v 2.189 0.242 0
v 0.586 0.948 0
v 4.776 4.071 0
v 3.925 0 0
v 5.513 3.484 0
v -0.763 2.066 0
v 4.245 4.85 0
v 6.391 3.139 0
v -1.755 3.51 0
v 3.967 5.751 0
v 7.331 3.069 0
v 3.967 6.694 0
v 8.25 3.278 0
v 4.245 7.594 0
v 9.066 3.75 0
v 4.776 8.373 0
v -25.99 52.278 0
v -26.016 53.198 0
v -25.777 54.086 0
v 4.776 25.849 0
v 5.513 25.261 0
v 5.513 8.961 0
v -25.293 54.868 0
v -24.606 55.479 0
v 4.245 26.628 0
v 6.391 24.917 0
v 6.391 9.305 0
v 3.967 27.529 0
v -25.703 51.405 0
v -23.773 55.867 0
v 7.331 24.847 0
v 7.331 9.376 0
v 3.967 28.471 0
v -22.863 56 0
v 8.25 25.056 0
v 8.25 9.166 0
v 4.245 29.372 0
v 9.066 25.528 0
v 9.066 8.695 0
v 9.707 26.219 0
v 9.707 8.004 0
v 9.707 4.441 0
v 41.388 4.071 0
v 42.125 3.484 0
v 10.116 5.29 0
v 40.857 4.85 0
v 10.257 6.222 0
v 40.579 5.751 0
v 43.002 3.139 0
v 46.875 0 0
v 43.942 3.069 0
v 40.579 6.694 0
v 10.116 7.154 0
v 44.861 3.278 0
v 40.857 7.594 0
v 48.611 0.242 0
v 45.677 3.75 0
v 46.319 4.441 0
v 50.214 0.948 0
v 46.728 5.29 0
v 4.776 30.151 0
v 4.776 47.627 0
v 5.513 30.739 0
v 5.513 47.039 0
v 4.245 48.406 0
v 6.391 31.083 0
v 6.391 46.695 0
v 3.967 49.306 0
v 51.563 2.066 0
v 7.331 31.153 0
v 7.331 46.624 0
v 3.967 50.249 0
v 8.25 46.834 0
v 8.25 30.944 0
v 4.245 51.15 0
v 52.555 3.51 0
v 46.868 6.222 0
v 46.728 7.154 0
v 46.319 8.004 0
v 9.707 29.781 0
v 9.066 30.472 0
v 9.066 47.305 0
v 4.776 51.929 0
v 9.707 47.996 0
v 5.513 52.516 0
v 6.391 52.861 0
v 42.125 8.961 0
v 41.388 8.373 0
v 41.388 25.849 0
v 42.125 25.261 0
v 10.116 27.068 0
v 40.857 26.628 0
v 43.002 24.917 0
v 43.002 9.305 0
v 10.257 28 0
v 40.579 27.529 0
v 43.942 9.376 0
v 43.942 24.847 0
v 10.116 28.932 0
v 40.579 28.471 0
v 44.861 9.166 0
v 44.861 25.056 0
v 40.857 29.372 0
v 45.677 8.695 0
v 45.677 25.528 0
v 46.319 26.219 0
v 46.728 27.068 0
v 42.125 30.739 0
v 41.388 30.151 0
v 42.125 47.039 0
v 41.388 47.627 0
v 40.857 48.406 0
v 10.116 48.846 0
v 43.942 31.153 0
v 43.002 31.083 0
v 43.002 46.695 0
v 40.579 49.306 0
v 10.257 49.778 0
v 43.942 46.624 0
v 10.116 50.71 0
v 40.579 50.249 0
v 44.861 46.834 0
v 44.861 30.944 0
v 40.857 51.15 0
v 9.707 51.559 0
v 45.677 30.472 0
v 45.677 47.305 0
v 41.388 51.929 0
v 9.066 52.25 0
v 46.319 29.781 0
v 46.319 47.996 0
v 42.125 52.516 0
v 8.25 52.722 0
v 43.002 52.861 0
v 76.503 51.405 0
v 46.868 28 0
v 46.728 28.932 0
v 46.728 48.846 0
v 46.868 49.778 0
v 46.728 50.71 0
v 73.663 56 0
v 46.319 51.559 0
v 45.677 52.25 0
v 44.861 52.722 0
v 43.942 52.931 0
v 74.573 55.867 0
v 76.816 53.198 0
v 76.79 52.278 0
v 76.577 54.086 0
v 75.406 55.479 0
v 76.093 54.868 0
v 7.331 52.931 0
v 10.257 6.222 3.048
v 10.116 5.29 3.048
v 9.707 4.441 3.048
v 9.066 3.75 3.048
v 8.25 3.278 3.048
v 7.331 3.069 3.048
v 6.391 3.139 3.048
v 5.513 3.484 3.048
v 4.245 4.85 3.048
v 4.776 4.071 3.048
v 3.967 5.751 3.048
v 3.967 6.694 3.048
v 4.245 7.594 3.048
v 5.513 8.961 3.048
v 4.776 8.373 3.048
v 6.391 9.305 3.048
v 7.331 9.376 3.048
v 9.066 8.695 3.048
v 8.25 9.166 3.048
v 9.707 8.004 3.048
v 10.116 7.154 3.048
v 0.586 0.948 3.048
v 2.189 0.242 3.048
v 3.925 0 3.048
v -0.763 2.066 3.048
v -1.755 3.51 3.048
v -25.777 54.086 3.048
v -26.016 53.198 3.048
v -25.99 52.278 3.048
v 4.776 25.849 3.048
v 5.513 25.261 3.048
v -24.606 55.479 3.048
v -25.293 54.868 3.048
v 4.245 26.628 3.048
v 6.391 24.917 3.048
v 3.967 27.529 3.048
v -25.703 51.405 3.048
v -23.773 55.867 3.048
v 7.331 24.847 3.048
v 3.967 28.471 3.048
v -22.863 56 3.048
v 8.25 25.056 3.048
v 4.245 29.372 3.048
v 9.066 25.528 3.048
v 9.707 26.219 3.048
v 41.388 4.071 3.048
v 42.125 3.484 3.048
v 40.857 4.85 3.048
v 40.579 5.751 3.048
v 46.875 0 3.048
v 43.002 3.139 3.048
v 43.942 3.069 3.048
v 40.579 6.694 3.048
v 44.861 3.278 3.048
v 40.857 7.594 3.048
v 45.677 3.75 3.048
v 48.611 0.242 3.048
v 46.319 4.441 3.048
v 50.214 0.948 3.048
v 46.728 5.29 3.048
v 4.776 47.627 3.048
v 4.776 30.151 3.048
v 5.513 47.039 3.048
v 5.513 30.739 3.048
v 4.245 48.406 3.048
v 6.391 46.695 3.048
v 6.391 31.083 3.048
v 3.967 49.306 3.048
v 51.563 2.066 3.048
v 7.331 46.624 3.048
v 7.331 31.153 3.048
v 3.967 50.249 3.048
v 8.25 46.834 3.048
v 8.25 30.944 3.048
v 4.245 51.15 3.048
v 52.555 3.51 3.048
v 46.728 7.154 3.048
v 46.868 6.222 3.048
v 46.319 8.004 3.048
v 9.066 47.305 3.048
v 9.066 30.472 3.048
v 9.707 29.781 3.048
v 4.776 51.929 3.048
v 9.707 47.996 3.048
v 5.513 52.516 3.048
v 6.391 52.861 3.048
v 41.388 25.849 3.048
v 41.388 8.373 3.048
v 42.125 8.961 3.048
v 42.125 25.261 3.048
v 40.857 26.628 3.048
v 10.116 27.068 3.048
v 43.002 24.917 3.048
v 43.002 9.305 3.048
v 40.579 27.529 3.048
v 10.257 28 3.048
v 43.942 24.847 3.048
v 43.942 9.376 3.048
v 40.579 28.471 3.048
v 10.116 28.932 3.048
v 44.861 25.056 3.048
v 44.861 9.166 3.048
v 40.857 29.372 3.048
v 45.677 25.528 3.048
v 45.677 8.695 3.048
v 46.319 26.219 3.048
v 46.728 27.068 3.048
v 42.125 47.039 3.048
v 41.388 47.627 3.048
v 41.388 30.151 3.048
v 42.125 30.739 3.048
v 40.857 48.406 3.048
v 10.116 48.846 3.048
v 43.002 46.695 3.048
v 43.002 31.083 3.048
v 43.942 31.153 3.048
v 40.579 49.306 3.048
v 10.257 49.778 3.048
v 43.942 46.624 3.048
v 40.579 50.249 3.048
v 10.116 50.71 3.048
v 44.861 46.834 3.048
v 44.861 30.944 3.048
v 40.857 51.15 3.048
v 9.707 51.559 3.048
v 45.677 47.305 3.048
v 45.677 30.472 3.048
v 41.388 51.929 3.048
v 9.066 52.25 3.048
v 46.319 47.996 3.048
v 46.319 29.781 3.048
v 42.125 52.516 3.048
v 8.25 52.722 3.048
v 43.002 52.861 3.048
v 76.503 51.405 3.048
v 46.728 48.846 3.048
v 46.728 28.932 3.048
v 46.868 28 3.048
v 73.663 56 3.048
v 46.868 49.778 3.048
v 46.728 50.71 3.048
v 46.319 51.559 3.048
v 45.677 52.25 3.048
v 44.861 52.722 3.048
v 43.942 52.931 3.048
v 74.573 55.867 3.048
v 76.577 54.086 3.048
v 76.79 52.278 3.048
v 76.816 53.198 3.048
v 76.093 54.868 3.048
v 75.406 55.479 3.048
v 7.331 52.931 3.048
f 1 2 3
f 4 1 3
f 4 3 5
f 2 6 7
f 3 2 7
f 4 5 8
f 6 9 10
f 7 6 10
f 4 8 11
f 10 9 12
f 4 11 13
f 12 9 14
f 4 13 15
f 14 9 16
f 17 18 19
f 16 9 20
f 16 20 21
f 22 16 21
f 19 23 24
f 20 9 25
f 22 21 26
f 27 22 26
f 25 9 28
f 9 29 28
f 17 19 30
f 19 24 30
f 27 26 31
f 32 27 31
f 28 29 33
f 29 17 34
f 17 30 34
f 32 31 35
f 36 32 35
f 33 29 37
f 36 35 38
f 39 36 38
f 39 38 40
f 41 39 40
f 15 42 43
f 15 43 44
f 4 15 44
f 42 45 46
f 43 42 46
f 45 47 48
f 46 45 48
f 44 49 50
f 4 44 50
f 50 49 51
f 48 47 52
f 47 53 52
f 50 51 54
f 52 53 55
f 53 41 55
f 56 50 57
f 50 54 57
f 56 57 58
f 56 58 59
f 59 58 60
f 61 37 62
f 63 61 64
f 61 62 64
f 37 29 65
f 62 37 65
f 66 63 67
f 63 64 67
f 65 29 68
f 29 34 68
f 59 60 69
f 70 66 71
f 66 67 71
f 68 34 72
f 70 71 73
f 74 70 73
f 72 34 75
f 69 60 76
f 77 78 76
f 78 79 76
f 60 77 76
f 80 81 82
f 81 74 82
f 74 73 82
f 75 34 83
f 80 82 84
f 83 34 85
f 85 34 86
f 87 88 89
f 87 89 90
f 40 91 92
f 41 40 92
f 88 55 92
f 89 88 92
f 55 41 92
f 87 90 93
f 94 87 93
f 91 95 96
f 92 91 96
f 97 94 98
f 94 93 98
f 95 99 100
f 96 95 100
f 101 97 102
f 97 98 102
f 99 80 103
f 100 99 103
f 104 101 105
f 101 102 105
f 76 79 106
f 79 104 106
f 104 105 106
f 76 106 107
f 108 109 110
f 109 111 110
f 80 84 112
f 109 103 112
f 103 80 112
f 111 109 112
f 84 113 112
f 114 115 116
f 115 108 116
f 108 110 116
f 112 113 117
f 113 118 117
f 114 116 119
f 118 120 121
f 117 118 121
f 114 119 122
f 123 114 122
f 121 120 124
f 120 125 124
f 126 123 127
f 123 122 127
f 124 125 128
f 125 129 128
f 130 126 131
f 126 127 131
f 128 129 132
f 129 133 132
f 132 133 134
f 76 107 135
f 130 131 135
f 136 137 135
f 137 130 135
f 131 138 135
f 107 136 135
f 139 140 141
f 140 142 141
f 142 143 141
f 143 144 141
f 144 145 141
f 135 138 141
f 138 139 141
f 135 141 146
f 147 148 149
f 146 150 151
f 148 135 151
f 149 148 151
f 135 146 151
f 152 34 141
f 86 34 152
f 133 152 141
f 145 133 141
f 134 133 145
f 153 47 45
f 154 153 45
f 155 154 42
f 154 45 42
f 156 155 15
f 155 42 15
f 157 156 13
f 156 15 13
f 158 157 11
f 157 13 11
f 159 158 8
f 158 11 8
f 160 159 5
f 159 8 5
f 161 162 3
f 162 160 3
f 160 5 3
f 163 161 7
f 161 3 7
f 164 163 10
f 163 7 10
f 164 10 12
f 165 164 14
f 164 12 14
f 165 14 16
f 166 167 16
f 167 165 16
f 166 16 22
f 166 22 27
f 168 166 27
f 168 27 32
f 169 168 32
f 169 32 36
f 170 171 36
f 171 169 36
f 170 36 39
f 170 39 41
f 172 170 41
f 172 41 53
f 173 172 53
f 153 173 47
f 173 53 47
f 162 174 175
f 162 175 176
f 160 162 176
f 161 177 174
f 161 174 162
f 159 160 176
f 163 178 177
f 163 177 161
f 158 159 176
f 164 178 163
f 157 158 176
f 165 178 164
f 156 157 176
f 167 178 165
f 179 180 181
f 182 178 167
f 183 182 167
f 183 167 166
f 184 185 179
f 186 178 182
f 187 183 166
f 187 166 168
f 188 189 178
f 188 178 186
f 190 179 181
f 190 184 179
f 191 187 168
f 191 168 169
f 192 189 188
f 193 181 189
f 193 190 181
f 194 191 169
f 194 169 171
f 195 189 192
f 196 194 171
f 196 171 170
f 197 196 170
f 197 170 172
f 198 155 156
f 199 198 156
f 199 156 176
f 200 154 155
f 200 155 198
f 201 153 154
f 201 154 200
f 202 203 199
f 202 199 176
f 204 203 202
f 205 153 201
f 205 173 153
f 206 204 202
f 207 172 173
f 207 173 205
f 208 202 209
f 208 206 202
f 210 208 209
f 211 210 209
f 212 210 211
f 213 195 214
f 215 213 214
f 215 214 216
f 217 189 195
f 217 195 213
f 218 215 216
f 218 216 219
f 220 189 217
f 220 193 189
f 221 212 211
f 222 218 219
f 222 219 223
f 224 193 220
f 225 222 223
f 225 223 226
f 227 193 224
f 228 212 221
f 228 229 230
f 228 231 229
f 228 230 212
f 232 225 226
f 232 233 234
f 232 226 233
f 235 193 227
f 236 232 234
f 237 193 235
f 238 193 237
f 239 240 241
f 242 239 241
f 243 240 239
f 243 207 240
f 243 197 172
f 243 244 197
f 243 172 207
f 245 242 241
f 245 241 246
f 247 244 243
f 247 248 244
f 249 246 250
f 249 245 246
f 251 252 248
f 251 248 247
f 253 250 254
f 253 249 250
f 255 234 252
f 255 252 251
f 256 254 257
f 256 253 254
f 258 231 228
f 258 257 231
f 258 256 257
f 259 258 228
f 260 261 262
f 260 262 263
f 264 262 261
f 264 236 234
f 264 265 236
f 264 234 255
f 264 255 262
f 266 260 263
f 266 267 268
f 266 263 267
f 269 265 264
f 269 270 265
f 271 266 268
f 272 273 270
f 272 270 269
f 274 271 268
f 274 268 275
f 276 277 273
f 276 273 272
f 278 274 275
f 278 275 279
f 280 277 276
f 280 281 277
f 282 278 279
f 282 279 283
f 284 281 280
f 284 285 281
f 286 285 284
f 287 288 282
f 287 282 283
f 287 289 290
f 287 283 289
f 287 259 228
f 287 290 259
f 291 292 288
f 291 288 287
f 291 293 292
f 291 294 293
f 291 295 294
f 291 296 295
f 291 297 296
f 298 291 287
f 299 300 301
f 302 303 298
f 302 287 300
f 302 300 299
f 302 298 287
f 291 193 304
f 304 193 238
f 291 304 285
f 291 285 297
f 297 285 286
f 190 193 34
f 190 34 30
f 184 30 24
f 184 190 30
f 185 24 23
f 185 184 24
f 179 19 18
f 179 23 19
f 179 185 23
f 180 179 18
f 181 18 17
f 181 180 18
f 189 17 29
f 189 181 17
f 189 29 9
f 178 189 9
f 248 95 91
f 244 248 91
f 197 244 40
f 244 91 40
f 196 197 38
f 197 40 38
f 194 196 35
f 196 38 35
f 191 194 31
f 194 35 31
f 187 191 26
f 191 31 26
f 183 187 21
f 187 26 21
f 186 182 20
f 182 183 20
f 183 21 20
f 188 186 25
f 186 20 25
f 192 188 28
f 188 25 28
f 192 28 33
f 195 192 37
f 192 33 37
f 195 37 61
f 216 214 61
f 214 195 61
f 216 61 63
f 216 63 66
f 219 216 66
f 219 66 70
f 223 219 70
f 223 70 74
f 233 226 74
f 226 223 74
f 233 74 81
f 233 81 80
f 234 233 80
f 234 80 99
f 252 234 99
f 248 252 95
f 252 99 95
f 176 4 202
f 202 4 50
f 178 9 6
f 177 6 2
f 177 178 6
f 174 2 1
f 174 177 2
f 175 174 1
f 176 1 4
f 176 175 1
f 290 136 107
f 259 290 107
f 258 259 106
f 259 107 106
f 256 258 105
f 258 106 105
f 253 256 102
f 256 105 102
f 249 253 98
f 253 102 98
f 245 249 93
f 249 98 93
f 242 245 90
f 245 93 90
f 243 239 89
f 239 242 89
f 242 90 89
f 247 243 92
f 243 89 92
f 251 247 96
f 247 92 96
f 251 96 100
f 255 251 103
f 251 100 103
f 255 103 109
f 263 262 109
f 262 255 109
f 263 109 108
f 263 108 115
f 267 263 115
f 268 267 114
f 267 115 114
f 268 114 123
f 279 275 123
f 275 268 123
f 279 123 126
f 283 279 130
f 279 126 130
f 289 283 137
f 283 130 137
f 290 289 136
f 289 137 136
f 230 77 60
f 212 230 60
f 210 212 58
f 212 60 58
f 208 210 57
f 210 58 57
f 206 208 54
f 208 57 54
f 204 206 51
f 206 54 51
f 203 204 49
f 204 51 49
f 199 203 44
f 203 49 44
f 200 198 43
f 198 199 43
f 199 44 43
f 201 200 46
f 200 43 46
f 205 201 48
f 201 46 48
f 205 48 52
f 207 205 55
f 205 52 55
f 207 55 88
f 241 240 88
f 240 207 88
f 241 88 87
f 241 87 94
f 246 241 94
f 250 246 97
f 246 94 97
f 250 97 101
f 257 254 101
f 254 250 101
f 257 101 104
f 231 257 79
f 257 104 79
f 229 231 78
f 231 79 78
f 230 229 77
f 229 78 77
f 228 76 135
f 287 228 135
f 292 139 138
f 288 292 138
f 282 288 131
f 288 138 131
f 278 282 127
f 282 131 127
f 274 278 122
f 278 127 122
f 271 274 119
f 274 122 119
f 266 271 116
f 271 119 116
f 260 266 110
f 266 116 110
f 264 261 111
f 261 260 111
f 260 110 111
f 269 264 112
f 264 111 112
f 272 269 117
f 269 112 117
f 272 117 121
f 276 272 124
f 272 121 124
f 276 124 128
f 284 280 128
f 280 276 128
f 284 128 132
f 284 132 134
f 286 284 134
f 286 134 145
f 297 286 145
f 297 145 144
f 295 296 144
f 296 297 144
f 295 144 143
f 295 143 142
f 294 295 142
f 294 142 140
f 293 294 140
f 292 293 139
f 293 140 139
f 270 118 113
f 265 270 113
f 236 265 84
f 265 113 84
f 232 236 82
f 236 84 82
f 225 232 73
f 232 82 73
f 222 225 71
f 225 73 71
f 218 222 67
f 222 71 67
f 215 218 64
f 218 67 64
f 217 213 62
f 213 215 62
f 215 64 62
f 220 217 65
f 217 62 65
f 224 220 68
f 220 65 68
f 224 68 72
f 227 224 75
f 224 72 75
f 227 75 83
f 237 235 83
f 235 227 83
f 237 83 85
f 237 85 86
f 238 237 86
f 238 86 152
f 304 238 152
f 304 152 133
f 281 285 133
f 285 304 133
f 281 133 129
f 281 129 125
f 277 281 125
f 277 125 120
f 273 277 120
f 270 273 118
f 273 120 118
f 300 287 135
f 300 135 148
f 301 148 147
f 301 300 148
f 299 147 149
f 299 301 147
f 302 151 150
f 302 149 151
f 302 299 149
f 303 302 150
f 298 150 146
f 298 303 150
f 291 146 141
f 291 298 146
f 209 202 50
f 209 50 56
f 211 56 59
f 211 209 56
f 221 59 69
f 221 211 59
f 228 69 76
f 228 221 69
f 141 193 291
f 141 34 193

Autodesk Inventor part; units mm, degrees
ref_plane "YZ Plane" through (0, 0, 0) normal (1, 0, 0) x (0, 1, 0)
ref_plane "XZ Plane" through (0, 0, 0) normal (0, 1, 0) x (-1, 0, 0)
ref_plane "XY Plane" through (0, 0, 0) normal (0, 0, 1) x (1, 0, 0)
sketch "Sketch1" plane through (0, 0, 0) normal (0, 0, 1) x (1, 0, 0)
  line L0 (0, 0) -> (50.8, 0)
  line L1 (-50.8, 101.6) -> (101.6, 101.6)
  line L2 (50.8, 0) -> (78.8, 56)
  line L3 (-28, 56) -> (0, 0)
  line L4 (14.6239, 7) -> (34.6239, 7)
  line L5 (34.6239, 7) -> (34.6239, 2)
  line L6 (34.6239, 2) -> (14.6239, 2)
  line L7 (14.6239, 2) -> (14.6239, 7)
  line L8 (50.8, 0) -> (50.8, 62.4863)
  line L9 (14.6239, 14) -> (34.6239, 14)
  line L10 (34.6239, 14) -> (34.6239, 9)
  line L11 (34.6239, 9) -> (14.6239, 9)
  line L12 (14.6239, 9) -> (14.6239, 14)
  line L13 (14.6239, 21) -> (34.6239, 21)
  line L14 (34.6239, 21) -> (34.6239, 16)
  line L15 (34.6239, 16) -> (14.6239, 16)
  line L16 (14.6239, 16) -> (14.6239, 21)
  line L17 (14.6239, 28) -> (34.6239, 28)
  line L18 (34.6239, 28) -> (34.6239, 23)
  line L19 (34.6239, 23) -> (14.6239, 23)
  line L20 (14.6239, 23) -> (14.6239, 28)
  line L21 (14.6239, 35) -> (34.6239, 35)
  line L22 (34.6239, 35) -> (34.6239, 30)
  line L23 (34.6239, 30) -> (14.6239, 30)
  line L24 (14.6239, 30) -> (14.6239, 35)
  line L25 (14.6239, 42) -> (34.6239, 42)
  line L26 (34.6239, 42) -> (34.6239, 37)
  line L27 (34.6239, 37) -> (14.6239, 37)
  line L28 (14.6239, 37) -> (14.6239, 42)
  circle A0 centre (43.7057, 6.2222) radius 3.1623
  circle A1 centre (43.7057, 28) radius 3.1623
  circle A2 centre (43.7057, 49.7778) radius 3.1623
  line L29 (25.4, 0) -> (25.4, -15.6085)
  circle A3 centre (7.0943, 49.7778) radius 3.1623
  circle A4 centre (7.0943, 6.2222) radius 3.1623
  circle A5 centre (7.0943, 28) radius 3.1623
  line L30 (34.6239, 44) -> (14.6239, 44)
  line L31 (14.6239, 44) -> (14.6239, 49)
  line L32 (34.6239, 49) -> (34.6239, 44)
  line L33 (14.6239, 49) -> (34.6239, 49)
  line L34 (34.6239, 51) -> (14.6239, 51)
  line L35 (14.6239, 51) -> (14.6239, 56)
  line L36 (14.6239, 56) -> (34.6239, 56)
  line L37 (34.6239, 56) -> (34.6239, 51)
  circle A6 centre (-34.29, 91.44) radius 3.1623
  circle A7 centre (85.09, 91.44) radius 3.1623
  line L38 (-28, 56) -> (78.8, 56)
  dimension "d8" = 50.8
  dimension "d9" = 152.4
  dimension "d10" = 101.6
  dimension "d11" = 50.8
  dimension "d12" = 20
  dimension "d13" = 5
  dimension "d14" = 2
  dimension "d15" = 7
  dimension "d16" = 6.3246
  dimension "d17" = 6.3246
  dimension "d18" = 6.3246
  dimension "d19" = 14
  dimension "d20" = 56
  dimension "d21" = 6.2222
  dimension "d22" = 6.2222
  dimension "d23" = 28
  dimension "d24" = 6.3246
  dimension "d25" = 6.3246
  dimension "d26" = 34.29
  dimension "d27" = 34.29
  dimension "d28" = 10.16
  dimension "d29" = 10.16
extrude "Plate1" add sketch "Sketch1" along normal blind 3.048 contours L3 L38 L35 L34 L37 L8 L0 | L8 L38 L2 | L36 L37 L34 L35 | L4 L5 L6 L7 | L9 L10 L11 L12 | L13 L14 L15 L16 | L17 L18 L19 L20 | L21 L22 L23 L24 | L25 L26 L27 L28 | L30 L31 L33 L32
fillet "Corner Round1" radius 6.35 2 edges at (0, 0, 1.524) (50.8, 0, 1.524)
fillet "Corner Round1" radius 3.175 2 edges at (-28, 56, 1.524) (78.8, 56, 1.524)
equation "\"d17\" = d16"
equation "\"d18\" = d17"
equation "\"d21\" = 0.111111 * d20"
equation "\"d22\" = d21"
equation "\"d23\" = 0.5 * d20"
equation "\"d27\" = d26"
equation "\"d29\" = d28"
equation "\"BendRadius\" = Thickness"
equation "\"BendReliefWidth\" = Thickness"
equation "\"BendReliefDepth\" = 0.5 * Thickness"
equation "\"CornerReliefSize\" = 4 * Thickness"
equation "\"MinimumRemnant\" = 2 * Thickness"
equation "\"TransitionRadius\" = BendRadius"
equation "\"JacobiRadiusSize\" = BendRadius"
equation "\"GapSize\" = Thickness"
equation "\"d32\" = BendRadius"
equation "\"Thickness\" = 3.048"
properties part number "Belt plate top"
